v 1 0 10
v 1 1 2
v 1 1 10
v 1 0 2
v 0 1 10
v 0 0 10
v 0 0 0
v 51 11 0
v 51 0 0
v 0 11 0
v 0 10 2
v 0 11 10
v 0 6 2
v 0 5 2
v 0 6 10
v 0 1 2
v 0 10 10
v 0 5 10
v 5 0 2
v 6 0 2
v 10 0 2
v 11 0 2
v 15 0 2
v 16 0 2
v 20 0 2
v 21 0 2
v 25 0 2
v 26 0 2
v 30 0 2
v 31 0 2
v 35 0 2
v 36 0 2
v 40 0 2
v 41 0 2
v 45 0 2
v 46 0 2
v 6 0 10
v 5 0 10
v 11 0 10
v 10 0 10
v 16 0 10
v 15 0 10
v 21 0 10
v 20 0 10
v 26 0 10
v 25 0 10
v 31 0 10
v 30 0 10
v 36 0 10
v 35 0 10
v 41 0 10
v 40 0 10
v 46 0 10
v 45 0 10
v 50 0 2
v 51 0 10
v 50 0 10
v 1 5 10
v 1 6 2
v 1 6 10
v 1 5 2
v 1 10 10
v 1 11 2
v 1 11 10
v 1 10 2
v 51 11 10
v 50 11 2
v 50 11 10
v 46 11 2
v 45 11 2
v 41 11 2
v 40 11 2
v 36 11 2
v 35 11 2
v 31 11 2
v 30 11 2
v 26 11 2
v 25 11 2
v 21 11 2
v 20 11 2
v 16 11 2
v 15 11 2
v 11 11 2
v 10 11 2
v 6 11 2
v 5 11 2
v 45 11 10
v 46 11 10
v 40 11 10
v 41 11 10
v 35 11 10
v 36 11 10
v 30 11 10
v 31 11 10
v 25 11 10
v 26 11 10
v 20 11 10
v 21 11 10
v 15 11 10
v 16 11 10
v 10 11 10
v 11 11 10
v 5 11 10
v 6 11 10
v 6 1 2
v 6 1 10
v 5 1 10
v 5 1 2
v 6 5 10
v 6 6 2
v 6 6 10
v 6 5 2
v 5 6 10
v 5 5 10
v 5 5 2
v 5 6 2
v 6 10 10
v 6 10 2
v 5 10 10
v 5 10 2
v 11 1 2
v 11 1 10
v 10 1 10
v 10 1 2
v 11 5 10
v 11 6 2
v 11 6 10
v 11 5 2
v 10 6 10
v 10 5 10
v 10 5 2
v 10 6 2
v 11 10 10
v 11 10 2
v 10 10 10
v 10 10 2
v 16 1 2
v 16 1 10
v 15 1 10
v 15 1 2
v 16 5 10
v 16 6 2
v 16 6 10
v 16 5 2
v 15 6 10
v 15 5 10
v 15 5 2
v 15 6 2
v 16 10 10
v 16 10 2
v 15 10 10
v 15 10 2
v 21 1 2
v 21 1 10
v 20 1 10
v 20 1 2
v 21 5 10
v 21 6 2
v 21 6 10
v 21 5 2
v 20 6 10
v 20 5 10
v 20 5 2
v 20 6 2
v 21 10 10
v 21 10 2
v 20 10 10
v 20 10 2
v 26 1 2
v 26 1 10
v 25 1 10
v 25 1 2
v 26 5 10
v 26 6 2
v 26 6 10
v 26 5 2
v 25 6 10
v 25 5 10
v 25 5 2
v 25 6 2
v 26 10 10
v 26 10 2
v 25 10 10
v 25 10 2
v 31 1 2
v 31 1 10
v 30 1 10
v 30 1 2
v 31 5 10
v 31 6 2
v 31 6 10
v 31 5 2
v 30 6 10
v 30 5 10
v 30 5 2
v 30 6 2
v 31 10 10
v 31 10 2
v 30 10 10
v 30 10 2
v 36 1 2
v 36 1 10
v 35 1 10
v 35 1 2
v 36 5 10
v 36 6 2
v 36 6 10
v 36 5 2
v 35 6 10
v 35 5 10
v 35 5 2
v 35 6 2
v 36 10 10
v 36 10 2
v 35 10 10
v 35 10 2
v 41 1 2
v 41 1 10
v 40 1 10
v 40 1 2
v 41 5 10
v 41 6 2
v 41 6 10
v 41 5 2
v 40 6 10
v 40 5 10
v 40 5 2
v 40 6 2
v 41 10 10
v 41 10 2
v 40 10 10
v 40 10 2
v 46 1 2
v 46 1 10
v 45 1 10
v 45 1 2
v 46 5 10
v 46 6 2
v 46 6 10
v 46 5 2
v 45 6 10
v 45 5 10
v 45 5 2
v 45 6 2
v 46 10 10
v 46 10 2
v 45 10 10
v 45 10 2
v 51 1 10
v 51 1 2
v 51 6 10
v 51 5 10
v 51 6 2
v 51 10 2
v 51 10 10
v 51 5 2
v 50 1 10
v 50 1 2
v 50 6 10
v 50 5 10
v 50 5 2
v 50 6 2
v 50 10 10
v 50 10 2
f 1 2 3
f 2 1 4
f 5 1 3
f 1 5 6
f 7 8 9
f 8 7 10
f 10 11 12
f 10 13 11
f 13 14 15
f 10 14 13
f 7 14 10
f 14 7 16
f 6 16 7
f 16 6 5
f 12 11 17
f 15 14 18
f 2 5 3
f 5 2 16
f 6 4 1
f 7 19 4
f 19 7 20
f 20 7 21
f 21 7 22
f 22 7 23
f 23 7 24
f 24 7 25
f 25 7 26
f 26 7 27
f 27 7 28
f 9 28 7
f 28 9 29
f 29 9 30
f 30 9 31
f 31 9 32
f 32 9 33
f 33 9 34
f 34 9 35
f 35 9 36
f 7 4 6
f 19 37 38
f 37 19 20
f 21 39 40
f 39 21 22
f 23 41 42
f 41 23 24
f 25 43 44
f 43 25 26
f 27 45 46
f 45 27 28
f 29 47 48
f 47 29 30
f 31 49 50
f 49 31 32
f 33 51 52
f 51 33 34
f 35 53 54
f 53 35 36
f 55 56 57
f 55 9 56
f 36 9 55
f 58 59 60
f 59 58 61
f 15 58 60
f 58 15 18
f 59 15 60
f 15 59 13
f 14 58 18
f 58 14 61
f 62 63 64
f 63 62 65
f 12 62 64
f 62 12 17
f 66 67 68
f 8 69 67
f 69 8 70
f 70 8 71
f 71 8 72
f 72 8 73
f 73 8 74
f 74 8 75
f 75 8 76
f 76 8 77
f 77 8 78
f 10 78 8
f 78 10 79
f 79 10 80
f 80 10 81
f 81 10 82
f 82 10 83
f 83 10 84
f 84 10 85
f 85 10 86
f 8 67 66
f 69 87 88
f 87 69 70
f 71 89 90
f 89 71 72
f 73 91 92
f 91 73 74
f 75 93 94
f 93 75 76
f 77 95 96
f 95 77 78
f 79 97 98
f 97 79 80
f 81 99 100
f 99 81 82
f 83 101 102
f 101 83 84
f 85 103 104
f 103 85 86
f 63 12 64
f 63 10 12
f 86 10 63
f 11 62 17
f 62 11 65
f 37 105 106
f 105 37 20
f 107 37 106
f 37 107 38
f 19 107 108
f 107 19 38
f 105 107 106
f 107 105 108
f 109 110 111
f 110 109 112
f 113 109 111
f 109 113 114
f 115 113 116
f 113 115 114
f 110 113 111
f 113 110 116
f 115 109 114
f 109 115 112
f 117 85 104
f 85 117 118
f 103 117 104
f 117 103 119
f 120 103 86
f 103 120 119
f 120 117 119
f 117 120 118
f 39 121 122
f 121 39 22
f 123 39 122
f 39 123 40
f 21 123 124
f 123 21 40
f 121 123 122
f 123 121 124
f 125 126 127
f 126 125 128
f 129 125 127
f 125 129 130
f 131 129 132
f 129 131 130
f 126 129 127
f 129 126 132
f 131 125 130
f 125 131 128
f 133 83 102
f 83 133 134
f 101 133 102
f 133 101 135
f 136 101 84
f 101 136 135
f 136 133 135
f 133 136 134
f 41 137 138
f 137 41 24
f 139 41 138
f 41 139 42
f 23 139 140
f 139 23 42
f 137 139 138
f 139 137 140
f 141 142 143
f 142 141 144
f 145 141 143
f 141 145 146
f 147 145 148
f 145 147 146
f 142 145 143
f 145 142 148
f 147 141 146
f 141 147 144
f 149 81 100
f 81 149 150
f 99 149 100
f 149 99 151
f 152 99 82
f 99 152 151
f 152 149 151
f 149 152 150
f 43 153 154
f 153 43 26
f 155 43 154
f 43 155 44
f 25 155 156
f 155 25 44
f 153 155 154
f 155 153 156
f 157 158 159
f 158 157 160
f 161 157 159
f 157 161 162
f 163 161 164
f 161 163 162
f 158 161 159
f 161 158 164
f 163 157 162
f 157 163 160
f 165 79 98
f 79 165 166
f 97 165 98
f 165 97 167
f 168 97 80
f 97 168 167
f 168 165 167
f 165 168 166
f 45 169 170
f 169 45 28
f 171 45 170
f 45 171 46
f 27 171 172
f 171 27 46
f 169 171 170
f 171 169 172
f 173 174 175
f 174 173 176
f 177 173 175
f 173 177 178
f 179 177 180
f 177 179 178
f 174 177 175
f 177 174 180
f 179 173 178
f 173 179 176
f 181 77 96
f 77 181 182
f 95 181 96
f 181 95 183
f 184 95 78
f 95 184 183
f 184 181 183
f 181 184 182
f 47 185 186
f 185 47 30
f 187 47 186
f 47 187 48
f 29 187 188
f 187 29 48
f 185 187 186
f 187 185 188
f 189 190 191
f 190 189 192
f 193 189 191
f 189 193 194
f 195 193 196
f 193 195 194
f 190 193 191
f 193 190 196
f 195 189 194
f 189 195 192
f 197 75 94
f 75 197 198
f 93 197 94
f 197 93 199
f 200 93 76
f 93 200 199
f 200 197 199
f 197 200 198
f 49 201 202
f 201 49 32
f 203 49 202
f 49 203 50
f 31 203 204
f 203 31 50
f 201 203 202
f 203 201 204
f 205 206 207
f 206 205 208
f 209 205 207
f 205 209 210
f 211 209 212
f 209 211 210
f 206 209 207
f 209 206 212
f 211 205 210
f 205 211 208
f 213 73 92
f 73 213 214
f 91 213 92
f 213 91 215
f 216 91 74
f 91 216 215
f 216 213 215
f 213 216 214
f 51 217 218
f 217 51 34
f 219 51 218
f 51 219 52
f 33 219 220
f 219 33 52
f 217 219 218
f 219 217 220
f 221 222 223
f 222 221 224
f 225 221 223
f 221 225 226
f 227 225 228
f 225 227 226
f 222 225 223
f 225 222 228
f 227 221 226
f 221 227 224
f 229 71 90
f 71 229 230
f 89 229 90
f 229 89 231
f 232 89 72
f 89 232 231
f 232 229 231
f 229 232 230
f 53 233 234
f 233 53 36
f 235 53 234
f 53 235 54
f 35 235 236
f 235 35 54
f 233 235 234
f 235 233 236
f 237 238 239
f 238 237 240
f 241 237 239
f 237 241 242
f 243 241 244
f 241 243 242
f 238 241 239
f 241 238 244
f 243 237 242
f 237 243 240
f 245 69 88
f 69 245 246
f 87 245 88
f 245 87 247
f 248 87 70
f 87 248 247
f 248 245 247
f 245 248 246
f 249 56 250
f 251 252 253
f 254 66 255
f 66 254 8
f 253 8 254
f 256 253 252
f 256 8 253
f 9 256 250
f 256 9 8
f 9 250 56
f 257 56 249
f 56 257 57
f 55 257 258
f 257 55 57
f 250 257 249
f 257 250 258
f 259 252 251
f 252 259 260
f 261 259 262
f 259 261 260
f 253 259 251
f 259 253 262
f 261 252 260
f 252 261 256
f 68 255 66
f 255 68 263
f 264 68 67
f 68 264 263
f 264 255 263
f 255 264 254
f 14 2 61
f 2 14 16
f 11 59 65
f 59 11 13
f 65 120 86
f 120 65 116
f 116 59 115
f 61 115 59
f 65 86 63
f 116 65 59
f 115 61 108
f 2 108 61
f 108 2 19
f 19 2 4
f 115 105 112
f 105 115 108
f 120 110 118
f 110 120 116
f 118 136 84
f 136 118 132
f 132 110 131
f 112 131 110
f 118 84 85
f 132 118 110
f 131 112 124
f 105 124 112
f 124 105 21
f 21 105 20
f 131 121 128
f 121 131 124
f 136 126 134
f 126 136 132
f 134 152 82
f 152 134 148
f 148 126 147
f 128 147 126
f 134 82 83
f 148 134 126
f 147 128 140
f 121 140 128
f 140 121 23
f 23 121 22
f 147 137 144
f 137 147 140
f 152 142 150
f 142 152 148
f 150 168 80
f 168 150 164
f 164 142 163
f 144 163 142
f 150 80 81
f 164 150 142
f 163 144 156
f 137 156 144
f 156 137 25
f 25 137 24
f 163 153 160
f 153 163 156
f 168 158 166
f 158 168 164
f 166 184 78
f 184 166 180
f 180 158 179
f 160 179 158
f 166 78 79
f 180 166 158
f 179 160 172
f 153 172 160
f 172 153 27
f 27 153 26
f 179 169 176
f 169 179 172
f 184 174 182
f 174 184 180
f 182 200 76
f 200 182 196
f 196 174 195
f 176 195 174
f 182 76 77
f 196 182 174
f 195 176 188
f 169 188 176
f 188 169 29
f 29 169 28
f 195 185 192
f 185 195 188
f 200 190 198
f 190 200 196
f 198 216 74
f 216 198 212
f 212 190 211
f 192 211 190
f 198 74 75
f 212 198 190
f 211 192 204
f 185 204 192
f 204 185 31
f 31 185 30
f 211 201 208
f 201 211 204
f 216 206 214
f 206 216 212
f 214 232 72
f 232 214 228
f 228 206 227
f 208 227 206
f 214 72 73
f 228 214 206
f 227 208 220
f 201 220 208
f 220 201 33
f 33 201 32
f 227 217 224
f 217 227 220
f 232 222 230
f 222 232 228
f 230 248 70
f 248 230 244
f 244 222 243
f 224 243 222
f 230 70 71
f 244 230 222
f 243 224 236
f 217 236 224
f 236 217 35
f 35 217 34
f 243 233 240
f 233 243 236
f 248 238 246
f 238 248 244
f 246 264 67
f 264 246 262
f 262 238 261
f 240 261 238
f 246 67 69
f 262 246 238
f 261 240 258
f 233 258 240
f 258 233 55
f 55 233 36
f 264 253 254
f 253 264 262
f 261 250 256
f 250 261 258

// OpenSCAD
wBase = 51;
dBase = 11;
hBase = 2;
wTeeth = 1;
dTeeth = 1;
hTeeth = 10;
teethSpace = 5;

union(){
    cube([wBase,dBase,hBase]); //base
    for (h = [0:10]) {
        translate ([teethSpace*h,0,0]){
        cube([wTeeth,dTeeth,hTeeth]);
            translate ([0,teethSpace,0]){
            cube([wTeeth,dTeeth,hTeeth]);
            }
            translate ([0,teethSpace*2,0]){
            cube([wTeeth,dTeeth,hTeeth]);
            }
            //translate ([0,teethSpace*3,0]){
            //cube([wTeeth,dTeeth,hTeeth]);
            //}
        }
    }
        
}
